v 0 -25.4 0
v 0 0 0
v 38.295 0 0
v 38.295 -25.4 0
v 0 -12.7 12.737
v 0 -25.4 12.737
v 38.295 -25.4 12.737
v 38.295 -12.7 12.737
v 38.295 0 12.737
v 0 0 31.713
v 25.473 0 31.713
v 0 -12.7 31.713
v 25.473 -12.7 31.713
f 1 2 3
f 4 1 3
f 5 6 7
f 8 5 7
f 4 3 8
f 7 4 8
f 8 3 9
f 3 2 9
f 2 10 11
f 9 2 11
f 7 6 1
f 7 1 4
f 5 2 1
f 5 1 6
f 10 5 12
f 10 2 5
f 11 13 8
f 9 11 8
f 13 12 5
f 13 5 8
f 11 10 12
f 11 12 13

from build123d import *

# Parameters (mm, degrees)
F0_W     = 38.2953844965
F0_H     = 31.7133665085
F1_DEPTH = 25.4
F2_W     = 38.2953844965
F2_H     = 18.9767321572
F3_DEPTH = 12.7
F5_DEPTH = 12.701


with BuildPart() as f1:
    # F0 (on Front) → F1 (new body)
    with BuildSketch(Plane.XZ):
        with Locations((19.1476922482, 15.8566832542)):
            Rectangle(F0_W, F0_H)
    extrude(amount=F1_DEPTH)

    # F2 (on face) → F3 (cut)
    with BuildSketch(Plane.XZ.offset(25.4)):
        with Locations((19.1476922482, 22.2250004299)):
            Rectangle(F2_W, F2_H)
    extrude(amount=-F3_DEPTH, mode=Mode.SUBTRACT)

    # F4 (on face) → F5 (cut, through all)
    with BuildSketch(Plane.XZ.offset(12.7)):
        Polygon((38.2953844965, 31.7133665085), (25.4732687026, 31.7133665085), (38.2953844965, 12.7366343513), align=None)
    extrude(amount=-F5_DEPTH, mode=Mode.SUBTRACT)


solid = f1.part
